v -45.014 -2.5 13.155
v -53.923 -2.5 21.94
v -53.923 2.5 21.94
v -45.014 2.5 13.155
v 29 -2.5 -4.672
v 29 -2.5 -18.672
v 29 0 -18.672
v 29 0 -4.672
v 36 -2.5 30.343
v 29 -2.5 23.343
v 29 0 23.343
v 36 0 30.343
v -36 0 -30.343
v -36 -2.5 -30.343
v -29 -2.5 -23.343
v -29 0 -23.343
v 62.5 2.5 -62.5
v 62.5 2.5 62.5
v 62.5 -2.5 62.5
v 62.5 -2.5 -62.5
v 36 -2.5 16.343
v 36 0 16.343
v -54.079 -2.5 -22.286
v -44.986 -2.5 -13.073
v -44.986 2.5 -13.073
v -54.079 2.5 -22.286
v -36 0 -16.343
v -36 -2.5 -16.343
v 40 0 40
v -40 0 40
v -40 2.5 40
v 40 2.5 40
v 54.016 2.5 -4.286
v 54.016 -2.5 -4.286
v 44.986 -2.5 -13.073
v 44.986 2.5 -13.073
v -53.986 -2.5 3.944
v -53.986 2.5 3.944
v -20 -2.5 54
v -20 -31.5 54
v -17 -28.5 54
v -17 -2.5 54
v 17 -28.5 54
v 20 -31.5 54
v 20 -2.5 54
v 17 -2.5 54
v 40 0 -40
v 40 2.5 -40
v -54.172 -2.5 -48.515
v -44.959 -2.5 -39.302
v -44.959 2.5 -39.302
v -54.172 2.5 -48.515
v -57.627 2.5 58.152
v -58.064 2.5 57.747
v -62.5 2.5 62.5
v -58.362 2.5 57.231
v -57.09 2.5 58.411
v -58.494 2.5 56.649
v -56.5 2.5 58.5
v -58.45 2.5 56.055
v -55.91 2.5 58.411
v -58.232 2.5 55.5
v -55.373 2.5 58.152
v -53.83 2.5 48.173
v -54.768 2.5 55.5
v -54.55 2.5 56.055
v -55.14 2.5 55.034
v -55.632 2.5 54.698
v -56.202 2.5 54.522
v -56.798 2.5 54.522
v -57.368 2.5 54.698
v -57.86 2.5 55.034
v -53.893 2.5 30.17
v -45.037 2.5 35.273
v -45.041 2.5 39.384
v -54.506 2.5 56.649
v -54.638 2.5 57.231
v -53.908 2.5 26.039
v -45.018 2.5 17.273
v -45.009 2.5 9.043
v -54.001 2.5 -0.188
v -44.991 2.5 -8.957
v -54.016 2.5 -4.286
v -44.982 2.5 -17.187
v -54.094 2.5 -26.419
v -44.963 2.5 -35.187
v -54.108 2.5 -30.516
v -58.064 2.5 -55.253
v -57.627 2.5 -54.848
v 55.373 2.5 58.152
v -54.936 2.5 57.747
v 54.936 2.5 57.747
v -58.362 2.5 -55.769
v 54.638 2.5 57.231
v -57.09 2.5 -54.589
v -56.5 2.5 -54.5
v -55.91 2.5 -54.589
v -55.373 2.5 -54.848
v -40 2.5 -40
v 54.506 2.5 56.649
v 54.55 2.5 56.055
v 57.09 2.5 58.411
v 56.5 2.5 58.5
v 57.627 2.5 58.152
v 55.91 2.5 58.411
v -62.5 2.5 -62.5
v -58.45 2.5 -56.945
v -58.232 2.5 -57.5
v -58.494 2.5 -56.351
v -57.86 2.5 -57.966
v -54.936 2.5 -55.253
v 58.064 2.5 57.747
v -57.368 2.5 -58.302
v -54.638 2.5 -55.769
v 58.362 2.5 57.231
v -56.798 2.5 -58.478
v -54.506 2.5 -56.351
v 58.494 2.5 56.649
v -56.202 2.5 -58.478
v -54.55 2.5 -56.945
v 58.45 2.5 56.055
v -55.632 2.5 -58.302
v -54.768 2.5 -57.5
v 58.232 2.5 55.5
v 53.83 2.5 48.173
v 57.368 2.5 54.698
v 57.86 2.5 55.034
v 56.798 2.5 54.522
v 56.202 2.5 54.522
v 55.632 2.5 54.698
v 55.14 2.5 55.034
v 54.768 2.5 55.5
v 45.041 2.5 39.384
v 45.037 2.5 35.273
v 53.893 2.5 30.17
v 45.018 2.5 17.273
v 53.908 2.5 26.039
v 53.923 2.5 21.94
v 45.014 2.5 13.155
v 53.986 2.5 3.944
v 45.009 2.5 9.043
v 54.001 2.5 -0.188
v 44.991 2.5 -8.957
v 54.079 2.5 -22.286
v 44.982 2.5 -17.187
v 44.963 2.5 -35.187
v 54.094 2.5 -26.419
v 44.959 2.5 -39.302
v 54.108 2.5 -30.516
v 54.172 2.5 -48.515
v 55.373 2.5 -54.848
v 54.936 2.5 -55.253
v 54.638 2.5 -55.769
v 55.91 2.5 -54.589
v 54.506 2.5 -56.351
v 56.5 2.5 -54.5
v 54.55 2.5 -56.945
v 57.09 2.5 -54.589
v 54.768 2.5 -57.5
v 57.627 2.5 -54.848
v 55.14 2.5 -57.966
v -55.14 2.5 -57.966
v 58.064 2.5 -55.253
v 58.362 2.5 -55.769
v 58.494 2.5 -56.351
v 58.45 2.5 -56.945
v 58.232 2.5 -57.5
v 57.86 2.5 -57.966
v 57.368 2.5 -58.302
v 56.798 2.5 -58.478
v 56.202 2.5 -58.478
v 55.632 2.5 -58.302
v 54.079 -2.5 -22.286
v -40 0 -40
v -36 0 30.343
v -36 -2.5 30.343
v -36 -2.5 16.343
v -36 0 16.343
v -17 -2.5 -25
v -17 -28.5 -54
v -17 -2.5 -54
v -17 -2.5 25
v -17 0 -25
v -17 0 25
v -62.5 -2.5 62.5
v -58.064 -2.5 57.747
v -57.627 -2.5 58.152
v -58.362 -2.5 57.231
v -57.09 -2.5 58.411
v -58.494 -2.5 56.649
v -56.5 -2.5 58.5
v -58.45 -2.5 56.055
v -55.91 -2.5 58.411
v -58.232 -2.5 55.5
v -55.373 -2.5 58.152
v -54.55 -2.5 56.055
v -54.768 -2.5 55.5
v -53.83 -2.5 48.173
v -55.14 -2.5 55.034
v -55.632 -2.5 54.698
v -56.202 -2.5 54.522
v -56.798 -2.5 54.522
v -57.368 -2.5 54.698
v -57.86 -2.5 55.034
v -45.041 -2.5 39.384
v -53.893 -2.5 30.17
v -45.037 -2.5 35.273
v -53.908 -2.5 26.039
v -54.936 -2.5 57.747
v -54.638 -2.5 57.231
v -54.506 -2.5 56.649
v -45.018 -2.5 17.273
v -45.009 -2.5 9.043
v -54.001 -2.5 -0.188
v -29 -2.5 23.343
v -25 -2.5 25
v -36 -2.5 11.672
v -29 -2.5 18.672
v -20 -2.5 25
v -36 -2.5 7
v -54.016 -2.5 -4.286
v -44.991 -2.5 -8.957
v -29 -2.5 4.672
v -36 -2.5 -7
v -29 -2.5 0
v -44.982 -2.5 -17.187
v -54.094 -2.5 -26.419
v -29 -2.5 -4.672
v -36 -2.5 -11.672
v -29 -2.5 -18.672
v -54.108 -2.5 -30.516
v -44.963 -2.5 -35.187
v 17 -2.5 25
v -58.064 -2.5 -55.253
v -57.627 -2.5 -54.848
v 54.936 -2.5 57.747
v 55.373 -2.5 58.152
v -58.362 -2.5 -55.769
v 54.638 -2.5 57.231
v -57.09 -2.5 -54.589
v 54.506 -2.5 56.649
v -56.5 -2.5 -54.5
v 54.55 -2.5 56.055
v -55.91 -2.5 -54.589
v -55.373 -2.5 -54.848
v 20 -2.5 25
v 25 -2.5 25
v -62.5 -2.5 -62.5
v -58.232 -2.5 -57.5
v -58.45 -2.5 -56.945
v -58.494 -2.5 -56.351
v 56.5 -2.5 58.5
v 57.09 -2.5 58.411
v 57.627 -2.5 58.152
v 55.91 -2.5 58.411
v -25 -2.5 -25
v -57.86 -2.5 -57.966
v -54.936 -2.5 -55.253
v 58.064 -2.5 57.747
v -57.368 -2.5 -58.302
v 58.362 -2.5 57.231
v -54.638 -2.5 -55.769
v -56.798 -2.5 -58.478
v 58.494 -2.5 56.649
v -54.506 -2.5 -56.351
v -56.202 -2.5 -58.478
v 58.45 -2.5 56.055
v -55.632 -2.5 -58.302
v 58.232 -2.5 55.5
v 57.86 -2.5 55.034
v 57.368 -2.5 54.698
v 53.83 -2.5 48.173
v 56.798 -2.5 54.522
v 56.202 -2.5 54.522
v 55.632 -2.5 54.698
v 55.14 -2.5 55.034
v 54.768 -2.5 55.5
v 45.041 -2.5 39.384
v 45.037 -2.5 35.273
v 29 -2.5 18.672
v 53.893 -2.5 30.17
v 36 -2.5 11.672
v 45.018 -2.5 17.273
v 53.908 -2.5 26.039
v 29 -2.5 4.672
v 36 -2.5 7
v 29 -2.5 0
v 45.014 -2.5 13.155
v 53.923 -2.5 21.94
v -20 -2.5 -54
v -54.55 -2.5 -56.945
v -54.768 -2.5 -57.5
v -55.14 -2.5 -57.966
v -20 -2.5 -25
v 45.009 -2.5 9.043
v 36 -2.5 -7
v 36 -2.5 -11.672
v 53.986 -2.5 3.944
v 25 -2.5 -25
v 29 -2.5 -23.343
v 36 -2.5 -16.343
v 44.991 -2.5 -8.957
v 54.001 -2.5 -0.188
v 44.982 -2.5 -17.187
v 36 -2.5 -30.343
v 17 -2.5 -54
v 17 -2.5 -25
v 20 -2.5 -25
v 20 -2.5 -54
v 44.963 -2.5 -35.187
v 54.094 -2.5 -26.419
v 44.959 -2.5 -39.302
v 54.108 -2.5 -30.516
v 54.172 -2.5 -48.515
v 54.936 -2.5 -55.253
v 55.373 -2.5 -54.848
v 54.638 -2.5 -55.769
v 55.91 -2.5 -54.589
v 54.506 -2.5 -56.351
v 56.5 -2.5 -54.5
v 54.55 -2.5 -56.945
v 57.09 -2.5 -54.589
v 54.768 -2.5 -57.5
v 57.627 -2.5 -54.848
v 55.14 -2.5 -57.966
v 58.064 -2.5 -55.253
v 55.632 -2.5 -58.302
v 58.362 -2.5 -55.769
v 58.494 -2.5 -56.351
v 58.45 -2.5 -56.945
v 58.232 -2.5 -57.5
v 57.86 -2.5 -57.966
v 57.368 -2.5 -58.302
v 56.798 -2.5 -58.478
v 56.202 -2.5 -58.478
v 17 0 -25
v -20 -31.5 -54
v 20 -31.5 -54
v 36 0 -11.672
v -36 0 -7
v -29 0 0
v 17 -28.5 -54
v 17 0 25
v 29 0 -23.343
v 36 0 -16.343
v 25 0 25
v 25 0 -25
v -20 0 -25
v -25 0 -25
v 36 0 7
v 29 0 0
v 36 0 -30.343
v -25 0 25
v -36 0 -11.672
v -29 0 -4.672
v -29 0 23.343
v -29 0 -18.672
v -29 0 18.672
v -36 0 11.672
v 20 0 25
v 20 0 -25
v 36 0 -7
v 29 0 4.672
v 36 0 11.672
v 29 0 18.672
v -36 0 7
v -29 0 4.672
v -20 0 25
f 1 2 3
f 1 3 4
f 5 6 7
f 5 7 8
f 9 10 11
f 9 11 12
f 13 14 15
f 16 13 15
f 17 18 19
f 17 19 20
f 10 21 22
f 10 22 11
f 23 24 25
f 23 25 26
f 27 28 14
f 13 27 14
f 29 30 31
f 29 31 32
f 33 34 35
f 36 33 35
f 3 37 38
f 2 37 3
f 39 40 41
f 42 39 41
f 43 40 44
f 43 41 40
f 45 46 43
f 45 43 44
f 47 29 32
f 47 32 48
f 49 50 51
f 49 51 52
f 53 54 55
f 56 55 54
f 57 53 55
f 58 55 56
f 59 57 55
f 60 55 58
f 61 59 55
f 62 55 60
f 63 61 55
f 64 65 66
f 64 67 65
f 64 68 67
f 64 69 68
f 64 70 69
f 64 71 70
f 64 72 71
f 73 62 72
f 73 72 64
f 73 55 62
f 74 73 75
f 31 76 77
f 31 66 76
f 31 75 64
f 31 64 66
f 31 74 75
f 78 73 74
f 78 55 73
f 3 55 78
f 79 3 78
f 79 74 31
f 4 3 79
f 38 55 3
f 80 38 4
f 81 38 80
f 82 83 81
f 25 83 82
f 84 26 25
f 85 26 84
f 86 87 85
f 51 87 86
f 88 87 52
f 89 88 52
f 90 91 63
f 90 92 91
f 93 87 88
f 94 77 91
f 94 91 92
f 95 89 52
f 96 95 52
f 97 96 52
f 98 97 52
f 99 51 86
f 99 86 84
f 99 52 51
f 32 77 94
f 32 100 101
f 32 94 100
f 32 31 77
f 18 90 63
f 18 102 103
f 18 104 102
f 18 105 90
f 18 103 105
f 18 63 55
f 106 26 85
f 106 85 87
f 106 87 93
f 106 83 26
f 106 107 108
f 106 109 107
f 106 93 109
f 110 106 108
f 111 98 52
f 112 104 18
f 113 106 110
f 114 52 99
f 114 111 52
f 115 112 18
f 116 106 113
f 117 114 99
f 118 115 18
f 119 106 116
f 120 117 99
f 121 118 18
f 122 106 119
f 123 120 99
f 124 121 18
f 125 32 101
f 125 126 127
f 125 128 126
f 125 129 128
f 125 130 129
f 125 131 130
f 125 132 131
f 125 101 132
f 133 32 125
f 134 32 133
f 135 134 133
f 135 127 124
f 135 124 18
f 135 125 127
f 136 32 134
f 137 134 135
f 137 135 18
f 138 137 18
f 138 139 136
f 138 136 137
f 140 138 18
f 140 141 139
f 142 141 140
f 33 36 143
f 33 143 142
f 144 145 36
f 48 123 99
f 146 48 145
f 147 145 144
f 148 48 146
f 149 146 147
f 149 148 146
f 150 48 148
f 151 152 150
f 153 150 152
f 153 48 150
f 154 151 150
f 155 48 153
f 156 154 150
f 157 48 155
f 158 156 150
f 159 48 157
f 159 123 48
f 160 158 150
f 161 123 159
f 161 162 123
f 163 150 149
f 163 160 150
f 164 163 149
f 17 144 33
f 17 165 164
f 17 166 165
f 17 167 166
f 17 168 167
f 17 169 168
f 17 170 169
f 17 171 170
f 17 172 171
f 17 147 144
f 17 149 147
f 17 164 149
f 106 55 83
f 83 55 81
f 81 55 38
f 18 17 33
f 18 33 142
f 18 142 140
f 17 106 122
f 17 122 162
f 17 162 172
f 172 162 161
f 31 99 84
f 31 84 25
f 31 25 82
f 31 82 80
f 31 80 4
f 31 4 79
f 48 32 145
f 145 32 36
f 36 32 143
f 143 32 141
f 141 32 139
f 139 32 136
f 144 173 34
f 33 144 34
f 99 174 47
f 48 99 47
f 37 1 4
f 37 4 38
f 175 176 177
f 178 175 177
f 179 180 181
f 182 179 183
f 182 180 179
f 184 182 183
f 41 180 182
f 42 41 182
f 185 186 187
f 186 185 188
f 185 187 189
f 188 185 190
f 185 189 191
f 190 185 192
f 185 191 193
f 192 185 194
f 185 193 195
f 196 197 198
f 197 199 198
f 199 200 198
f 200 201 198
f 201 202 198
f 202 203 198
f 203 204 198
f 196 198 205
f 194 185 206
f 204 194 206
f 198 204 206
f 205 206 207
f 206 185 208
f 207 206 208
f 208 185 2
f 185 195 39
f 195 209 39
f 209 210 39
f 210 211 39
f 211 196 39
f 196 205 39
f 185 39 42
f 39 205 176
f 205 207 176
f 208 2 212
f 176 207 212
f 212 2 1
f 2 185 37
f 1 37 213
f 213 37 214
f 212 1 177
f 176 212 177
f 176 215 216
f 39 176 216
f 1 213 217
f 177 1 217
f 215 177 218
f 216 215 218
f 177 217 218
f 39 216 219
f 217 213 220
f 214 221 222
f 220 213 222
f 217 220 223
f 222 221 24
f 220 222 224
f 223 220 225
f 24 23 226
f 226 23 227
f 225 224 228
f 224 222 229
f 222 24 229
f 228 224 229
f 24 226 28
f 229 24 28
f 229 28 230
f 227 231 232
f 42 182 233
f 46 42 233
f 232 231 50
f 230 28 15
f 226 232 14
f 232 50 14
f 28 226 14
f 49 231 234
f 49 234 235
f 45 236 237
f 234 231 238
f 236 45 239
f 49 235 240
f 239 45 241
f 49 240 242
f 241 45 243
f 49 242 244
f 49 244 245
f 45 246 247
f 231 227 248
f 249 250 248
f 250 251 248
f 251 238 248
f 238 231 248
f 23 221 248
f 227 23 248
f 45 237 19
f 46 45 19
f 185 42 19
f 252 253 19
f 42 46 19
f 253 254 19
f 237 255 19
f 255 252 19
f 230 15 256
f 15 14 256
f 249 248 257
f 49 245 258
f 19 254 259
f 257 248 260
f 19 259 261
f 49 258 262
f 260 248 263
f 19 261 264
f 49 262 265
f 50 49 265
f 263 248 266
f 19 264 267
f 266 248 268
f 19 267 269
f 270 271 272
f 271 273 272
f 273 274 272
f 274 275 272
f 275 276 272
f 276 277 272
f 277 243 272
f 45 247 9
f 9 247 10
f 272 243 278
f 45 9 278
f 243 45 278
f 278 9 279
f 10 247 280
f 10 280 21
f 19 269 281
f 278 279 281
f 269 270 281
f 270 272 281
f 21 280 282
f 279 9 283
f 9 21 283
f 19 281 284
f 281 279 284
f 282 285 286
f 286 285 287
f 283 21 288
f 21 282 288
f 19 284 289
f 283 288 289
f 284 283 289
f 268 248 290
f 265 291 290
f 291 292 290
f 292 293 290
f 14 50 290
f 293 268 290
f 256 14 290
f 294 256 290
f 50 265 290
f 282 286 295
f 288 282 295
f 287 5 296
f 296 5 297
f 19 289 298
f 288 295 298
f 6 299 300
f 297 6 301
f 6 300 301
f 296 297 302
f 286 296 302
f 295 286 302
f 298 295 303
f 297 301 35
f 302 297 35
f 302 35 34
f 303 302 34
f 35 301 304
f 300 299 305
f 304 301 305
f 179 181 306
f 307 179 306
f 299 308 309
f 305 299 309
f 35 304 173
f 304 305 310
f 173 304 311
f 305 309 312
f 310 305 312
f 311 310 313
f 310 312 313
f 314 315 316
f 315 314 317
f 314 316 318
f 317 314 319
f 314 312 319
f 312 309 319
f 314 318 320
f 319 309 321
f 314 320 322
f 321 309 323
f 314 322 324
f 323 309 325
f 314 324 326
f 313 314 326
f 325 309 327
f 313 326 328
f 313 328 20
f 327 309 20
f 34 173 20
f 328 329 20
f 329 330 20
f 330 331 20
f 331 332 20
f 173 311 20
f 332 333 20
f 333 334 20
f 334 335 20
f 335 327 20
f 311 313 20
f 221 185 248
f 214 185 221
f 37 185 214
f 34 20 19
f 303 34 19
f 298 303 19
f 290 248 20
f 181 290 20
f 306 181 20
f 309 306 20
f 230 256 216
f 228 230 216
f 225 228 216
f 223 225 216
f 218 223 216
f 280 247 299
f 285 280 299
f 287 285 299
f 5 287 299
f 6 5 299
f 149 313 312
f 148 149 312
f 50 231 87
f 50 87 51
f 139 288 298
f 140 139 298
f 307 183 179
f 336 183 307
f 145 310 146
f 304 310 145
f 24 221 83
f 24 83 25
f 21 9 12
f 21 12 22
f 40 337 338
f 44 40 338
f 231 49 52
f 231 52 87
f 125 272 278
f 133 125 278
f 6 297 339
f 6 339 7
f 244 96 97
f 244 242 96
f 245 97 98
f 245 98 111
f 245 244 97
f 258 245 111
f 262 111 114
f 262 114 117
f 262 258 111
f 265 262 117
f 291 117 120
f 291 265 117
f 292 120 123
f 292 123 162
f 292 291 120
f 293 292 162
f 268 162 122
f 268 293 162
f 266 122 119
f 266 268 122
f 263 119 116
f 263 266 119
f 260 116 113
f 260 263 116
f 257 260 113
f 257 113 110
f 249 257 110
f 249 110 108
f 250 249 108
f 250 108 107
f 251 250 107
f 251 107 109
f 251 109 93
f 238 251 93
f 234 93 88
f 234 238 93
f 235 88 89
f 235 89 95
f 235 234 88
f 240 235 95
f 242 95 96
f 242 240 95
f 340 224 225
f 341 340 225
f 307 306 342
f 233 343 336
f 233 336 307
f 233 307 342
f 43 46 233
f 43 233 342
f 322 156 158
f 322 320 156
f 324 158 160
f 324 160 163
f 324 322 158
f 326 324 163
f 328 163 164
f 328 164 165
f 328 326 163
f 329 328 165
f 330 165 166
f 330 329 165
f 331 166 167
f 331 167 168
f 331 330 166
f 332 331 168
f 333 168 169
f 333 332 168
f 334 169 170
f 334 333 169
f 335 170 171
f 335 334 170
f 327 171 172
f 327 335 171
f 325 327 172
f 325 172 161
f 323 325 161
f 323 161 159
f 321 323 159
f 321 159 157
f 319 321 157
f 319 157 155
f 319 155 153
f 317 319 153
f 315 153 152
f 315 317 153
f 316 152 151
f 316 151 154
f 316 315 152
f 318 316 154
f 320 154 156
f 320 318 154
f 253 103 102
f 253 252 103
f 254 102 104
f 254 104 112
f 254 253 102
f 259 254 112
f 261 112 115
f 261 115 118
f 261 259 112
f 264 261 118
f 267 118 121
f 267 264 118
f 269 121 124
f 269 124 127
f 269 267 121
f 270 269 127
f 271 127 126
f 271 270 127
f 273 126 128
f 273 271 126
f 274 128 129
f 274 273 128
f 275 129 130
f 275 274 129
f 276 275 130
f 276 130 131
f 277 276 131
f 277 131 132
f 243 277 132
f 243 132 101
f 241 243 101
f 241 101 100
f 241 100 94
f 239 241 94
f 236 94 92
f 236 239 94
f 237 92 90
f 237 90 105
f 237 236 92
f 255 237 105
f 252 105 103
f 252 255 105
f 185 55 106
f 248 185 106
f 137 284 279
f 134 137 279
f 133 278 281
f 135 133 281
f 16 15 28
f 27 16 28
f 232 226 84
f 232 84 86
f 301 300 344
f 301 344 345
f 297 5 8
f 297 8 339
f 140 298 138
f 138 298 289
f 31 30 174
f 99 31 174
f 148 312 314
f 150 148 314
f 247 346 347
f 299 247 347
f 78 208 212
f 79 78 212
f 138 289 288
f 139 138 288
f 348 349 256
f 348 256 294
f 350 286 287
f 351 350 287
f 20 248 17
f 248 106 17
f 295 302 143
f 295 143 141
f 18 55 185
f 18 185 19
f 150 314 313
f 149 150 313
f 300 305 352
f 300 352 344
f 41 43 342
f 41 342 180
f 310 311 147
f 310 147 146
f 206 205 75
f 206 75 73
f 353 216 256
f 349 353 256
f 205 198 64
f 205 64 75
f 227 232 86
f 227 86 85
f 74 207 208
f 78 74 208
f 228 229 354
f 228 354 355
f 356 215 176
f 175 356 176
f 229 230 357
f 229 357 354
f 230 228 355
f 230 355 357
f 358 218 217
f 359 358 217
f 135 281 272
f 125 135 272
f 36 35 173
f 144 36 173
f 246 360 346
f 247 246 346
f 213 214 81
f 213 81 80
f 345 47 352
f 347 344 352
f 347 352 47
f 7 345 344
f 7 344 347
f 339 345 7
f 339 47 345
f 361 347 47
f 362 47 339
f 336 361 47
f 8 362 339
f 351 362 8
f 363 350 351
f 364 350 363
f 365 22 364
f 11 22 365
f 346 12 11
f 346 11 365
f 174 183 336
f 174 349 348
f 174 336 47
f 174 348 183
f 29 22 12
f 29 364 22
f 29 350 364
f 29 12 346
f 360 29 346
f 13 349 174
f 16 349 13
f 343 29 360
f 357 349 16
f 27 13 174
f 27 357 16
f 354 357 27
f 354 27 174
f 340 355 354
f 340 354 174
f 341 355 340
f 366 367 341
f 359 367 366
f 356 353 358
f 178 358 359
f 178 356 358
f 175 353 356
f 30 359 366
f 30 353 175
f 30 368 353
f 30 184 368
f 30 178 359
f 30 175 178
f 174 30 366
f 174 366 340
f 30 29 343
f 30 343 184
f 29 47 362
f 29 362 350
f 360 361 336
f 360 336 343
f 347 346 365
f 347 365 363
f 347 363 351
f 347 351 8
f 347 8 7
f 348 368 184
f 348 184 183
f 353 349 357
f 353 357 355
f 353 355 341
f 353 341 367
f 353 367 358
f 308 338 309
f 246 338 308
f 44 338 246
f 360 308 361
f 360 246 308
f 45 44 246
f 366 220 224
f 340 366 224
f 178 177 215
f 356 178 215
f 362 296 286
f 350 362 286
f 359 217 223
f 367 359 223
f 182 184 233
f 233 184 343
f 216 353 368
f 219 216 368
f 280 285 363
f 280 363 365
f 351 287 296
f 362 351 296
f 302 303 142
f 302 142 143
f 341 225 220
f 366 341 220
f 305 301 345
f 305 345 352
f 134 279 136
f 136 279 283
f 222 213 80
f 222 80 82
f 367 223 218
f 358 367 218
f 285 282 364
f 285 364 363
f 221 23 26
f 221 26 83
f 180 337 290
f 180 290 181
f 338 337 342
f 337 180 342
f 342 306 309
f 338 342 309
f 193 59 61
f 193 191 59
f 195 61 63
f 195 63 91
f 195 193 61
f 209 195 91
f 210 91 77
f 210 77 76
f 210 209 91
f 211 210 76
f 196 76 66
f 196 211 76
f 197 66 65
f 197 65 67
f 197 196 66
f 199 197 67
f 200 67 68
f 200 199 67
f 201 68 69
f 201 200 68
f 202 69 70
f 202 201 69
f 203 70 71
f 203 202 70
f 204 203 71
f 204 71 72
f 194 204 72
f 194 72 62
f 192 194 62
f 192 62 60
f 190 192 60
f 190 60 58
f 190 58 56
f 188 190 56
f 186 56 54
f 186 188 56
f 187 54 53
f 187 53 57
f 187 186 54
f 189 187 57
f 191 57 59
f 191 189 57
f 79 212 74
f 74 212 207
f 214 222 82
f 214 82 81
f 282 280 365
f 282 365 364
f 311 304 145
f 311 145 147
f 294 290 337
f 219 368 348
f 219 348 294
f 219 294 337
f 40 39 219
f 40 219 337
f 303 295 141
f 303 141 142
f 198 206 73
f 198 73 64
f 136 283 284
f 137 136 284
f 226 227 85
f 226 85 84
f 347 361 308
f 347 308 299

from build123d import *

# Parameters (mm, degrees)
SKETCH_2_W               = 125
SKETCH_2_H               = 125
SKETCH_2_R               = 2
SKETCH_2_W_2             = 50
SKETCH_2_H_2             = 50
EXTRUDE_1_DEPTH          = 2.5
EXTRUDE_4_DEPTH          = 54
SKETCH_7_W               = 80
SKETCH_7_H               = 80
CUT_EXTRUDE_1_DEPTH      = 10
CUT_EXTRUDE_2_DEPTH      = 95.702164706
CUT_EXTRUDE_2_DEPTH_BACK = 5


with BuildPart() as part:
    # 스케치2 → 보스-돌출1 (new, symmetric)
    with BuildSketch(Plane(origin=(0, 0, 0), x_dir=(1, 0, 0), z_dir=(0, 1, 0))):
        Rectangle(SKETCH_2_W, SKETCH_2_H)
        with Locations((-56.5, 56.5)):
            Circle(SKETCH_2_R, mode=Mode.SUBTRACT)
        with Locations((56.5, 56.5)):
            Circle(SKETCH_2_R, mode=Mode.SUBTRACT)
        with Locations((-56.5, -56.5)):
            Circle(SKETCH_2_R, mode=Mode.SUBTRACT)
        with Locations((56.5, -56.5)):
            Circle(SKETCH_2_R, mode=Mode.SUBTRACT)
        Rectangle(SKETCH_2_W_2, SKETCH_2_H_2, mode=Mode.SUBTRACT)
    extrude(amount=EXTRUDE_1_DEPTH, both=True)

    # 스케치6 → 보스-돌출4 (add, symmetric)
    with BuildSketch(Plane.XY):
        Polygon((-20, 0), (-20, -31.5), (20, -31.5), (20, 0), (17, 0), (17, -28.5), (-17, -28.5), (-17, 0), align=None)
    extrude(amount=EXTRUDE_4_DEPTH, both=True)

    # 스케치7 → 컷-돌출1 (cut)
    with BuildSketch(Plane(origin=(0, 0, 0), x_dir=(1, 0, 0), z_dir=(0, 1, 0))):
        Rectangle(SKETCH_7_W, SKETCH_7_H)
    extrude(amount=CUT_EXTRUDE_1_DEPTH, mode=Mode.SUBTRACT)

    # 스케치8 → 컷-돌출2 (cut, two sides: drawn at the far end of the back side and taken through both)
    with BuildSketch(Plane(origin=(0, 2.5, 0), x_dir=(1, 0, 0), z_dir=(0, 1, 0)).offset(-CUT_EXTRUDE_2_DEPTH_BACK)):
        Polygon((54.07931581, 22.285580831), (54.015526938, 4.28569386), (44.986382589, 13.073341514), align=None)
        Polygon((36, -30.343145751), (36, -16.343145751), (29, -23.343145751), align=None)
        Polygon((29, 18.671572875), (29, 4.671572875), (36, 11.671572875), align=None)
        Polygon((36, 30.343145751), (29, 23.343145751), (36, 16.343145751), align=None)
        Polygon((53.829622097, -48.172767848), (45.041121619, -39.384267369), (53.893419828, -30.170381277), align=None)
        Polygon((45.036831341, -35.272800588), (45.018048518, -17.272810388), (53.90806007, -26.039210725), align=None)
        Polygon((44.95901306, 39.30215881), (54.172270373, 48.515416123), (54.1084815, 30.515529152), align=None)
        Polygon((53.922585518, -21.940432956), (45.013752114, -13.155472476), (53.986361248, -3.944254461), align=None)
        Polygon((45.009460593, -9.042814869), (54.001004771, 0.18784173), (44.99067777, 8.957175331), align=None)
        Polygon((44.982089846, 17.187170851), (54.093962598, 26.418598199), (44.963307022, 35.187161051), align=None)
        Polygon((29, 0), (36, 7), (36, -7), align=None)
        Polygon((36, -11.671572875), (29, -4.671572875), (29, -18.671572875), align=None)
        Polygon((-36, -7), (-36, 7), (-29, 0), align=None)
        Polygon((-29, -4.671572875), (-29, -18.671572875), (-36, -11.671572875), align=None)
        Polygon((-36, 16.343145751), (-36, 30.343145751), (-29, 23.343145751), align=None)
        Polygon((-36, -16.343145751), (-29, -23.343145751), (-36, -30.343145751), align=None)
        Polygon((-36, 11.671572875), (-29, 4.671572875), (-29, 18.671572875), align=None)
        Polygon((-53.893419828, -30.170381277), (-53.829622097, -48.172767848), (-45.041121619, -39.384267369), align=None)
        Polygon((-45.009460593, -9.042814869), (-44.99067777, 8.957175331), (-54.001004771, 0.18784173), align=None)
        Polygon((-53.986361248, -3.944254461), (-53.922585518, -21.940432956), (-45.013752114, -13.155472476), align=None)
        Polygon((-44.982089846, 17.187170851), (-44.963307022, 35.187161051), (-54.093962598, 26.418598199), align=None)
        Polygon((-54.1084815, 30.515529152), (-44.95901306, 39.30215881), (-54.172270373, 48.515416123), align=None)
        Polygon((-44.986382589, 13.073341514), (-54.07931581, 22.285580831), (-54.015526938, 4.28569386), align=None)
        Polygon((-53.90806007, -26.039210725), (-45.018048518, -17.272810388), (-45.036831341, -35.272800588), align=None)
    extrude(amount=CUT_EXTRUDE_2_DEPTH + CUT_EXTRUDE_2_DEPTH_BACK, mode=Mode.SUBTRACT)


solid = part.part
